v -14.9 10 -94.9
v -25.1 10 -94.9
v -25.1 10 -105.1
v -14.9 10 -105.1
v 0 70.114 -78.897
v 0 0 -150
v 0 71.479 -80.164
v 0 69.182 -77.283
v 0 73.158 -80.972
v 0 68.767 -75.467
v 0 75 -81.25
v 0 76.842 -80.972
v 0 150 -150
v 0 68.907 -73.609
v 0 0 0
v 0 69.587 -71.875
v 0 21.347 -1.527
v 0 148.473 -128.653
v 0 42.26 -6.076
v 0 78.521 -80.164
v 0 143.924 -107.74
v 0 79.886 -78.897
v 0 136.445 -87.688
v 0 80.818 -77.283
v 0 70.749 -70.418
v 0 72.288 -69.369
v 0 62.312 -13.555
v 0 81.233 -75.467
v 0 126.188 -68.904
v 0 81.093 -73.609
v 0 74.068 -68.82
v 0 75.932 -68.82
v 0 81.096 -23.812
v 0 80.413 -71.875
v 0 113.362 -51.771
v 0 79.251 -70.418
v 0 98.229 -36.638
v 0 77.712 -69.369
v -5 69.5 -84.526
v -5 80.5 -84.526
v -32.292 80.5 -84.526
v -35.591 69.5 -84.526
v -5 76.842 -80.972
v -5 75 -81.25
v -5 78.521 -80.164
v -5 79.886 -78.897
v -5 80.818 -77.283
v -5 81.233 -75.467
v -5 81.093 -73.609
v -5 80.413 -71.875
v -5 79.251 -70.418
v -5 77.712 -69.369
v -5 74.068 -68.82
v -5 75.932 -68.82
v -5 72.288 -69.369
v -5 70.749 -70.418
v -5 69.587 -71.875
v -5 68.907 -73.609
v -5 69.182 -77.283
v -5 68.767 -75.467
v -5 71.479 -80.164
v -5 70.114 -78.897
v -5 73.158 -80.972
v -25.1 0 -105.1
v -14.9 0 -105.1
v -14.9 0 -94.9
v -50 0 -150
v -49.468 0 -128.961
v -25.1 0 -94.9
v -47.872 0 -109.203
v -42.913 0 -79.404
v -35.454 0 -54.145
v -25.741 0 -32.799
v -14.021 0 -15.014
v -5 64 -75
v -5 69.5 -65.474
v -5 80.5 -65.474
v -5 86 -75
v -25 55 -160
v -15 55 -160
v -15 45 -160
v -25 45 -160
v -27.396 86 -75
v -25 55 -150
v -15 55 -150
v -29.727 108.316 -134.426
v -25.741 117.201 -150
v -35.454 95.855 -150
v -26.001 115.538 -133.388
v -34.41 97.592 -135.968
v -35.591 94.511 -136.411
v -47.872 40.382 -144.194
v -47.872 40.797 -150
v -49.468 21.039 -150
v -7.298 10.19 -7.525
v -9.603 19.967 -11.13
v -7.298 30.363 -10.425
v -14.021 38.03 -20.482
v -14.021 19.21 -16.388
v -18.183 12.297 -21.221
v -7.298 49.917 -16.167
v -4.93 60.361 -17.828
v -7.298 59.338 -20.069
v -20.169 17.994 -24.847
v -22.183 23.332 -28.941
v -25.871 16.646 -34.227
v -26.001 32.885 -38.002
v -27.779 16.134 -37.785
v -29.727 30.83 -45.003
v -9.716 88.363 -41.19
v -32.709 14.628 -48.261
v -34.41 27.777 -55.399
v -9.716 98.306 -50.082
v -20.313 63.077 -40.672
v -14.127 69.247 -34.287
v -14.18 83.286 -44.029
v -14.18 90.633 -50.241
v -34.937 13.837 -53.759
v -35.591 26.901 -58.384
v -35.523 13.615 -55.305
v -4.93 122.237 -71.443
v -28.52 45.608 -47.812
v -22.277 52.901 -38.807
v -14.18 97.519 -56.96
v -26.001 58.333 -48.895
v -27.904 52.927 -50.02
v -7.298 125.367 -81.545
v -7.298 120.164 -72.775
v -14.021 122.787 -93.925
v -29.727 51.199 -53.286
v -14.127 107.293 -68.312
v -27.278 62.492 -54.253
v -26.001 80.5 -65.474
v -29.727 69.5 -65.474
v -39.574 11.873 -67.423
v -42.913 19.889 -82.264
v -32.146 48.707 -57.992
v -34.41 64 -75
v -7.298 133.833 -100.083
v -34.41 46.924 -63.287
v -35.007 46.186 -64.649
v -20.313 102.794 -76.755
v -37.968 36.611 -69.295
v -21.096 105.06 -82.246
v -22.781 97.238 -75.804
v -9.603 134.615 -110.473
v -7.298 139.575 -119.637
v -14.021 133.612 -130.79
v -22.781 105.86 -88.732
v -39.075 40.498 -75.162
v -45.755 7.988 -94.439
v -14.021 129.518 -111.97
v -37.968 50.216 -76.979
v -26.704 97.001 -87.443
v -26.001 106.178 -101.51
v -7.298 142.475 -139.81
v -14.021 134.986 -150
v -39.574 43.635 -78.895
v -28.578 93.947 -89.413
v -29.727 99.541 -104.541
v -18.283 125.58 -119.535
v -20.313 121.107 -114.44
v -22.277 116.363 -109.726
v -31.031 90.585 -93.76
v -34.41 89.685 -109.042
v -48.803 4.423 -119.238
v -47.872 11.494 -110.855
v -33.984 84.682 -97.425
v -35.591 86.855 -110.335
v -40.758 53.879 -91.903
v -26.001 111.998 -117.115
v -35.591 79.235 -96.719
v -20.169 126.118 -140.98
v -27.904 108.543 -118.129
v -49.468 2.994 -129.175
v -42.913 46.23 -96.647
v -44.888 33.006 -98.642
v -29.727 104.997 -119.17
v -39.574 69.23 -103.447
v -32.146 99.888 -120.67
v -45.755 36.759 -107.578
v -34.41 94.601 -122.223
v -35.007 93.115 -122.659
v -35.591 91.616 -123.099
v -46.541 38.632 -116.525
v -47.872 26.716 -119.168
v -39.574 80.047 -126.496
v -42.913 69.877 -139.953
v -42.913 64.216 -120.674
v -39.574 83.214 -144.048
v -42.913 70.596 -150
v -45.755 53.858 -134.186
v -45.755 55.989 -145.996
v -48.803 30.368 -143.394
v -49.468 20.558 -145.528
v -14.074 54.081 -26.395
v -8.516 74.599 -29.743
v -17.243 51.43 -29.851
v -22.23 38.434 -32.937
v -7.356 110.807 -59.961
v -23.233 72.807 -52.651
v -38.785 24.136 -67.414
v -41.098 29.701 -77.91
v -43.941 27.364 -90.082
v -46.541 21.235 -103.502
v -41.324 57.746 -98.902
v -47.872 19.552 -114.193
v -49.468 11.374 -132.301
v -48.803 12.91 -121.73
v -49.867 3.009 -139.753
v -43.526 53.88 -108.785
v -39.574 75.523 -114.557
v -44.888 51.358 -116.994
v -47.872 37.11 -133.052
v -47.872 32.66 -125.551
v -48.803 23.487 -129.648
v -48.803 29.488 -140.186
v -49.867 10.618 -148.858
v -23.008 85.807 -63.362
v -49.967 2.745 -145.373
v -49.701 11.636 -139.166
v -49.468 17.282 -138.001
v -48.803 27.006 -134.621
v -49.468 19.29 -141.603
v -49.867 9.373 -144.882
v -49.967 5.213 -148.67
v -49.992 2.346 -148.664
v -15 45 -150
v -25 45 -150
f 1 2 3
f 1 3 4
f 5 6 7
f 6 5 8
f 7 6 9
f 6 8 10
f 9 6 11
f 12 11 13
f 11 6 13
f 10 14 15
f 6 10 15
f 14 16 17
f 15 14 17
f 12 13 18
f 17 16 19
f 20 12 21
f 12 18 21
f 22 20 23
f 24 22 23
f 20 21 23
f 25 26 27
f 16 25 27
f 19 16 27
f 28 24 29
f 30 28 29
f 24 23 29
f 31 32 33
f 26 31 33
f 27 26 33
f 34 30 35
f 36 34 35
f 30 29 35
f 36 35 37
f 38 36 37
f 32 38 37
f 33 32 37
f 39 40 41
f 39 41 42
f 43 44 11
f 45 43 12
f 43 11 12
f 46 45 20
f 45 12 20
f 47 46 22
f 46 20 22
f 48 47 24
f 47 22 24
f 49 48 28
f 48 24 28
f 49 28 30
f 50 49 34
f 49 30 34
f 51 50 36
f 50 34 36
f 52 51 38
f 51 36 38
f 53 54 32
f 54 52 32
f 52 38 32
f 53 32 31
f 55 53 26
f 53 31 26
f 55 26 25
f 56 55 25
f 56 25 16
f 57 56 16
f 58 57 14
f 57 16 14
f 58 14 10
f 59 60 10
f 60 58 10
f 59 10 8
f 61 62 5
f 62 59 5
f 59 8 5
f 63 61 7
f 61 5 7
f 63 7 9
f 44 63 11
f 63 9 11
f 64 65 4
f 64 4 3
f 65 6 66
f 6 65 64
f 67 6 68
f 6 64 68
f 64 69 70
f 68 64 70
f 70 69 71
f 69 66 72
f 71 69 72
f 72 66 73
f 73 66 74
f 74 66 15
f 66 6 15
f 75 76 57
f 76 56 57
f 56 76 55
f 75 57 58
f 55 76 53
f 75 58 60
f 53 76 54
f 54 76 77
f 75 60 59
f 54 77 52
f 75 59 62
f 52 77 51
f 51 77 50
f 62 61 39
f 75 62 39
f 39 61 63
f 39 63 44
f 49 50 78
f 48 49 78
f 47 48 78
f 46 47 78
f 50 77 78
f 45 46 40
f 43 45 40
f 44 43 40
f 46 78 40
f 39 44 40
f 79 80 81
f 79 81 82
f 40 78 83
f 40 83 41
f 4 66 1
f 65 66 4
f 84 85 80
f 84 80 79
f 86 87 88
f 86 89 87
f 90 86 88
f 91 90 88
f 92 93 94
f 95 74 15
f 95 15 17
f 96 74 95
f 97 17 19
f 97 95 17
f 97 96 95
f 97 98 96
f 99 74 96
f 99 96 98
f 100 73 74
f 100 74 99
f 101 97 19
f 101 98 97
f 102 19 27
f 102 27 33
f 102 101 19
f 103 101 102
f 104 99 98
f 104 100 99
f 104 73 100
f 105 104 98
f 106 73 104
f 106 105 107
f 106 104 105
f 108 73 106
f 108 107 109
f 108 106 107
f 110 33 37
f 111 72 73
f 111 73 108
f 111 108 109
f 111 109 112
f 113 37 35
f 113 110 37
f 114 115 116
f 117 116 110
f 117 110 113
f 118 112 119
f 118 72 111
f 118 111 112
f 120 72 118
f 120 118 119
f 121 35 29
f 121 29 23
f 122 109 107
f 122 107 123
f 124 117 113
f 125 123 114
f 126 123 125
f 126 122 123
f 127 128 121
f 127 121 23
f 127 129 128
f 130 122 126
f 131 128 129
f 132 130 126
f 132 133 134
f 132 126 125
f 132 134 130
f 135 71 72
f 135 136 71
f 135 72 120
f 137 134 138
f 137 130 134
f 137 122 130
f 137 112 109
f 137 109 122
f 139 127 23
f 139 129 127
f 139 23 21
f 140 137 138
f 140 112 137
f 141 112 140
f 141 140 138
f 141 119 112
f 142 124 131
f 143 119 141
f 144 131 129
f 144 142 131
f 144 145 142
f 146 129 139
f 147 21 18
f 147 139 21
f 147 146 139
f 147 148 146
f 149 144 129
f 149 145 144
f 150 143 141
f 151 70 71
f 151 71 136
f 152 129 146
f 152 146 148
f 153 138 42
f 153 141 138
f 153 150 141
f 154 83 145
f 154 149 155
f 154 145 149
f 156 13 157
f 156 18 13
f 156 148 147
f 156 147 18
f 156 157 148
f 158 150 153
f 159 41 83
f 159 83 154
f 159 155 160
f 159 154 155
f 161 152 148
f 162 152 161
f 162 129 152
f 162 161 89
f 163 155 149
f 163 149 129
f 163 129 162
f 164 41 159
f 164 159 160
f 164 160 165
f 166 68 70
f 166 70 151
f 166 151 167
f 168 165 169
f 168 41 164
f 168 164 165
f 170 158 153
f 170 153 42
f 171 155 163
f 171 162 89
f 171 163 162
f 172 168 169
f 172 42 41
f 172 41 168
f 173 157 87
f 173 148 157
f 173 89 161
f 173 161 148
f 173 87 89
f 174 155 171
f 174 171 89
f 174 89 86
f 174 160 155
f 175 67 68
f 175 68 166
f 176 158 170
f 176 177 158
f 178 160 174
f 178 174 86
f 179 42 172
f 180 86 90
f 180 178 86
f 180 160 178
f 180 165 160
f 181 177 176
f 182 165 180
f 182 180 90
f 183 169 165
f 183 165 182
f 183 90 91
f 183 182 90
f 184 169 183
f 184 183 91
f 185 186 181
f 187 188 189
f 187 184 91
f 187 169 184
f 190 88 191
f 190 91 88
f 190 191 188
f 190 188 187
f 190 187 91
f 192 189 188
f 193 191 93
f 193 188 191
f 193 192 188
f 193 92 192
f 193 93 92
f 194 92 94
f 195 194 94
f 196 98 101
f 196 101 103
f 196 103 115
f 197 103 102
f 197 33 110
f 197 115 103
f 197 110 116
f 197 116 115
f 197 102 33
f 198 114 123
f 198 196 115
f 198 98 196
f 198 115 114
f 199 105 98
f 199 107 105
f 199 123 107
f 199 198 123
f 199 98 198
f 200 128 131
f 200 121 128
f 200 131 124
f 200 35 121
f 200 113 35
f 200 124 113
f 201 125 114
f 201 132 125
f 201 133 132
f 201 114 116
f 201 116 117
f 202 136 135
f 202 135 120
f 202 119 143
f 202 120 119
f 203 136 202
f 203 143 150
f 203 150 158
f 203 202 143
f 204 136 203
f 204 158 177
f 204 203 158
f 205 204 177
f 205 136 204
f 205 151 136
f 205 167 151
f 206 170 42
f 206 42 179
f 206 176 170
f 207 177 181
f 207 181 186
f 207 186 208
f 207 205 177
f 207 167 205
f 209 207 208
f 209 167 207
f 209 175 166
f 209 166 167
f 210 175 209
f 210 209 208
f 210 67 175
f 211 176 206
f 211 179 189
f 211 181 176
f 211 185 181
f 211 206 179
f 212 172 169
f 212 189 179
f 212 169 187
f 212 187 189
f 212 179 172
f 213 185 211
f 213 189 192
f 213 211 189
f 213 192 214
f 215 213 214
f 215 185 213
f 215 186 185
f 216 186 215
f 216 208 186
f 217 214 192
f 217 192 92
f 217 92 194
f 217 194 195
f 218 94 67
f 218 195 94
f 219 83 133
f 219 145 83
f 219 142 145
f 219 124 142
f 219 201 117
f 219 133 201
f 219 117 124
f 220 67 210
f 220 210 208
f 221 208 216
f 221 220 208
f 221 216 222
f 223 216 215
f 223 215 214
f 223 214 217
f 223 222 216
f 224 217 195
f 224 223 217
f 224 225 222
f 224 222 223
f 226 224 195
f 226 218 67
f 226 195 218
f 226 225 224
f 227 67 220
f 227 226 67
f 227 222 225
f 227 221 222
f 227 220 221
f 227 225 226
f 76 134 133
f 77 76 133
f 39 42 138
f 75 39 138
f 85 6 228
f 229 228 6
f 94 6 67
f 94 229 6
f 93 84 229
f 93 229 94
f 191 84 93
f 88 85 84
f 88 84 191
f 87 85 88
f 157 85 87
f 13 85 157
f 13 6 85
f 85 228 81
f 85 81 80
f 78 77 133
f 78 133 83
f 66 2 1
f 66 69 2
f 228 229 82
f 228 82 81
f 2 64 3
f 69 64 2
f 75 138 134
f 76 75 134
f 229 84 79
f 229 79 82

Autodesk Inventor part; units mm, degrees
ref_plane "YZ Plane" through (0, 0, 0) normal (1, 0, 0) x (0, 1, 0)
ref_plane "XZ Plane" through (0, 0, 0) normal (0, 1, 0) x (-1, 0, 0)
ref_plane "XY Plane" through (0, 0, 0) normal (0, 0, 1) x (1, 0, 0)
sketch "Sketch1" plane through (0, 0, 0) normal (0, 1, 0) x (-1, 0, 0)
  line L0 (0, 0) -> (0, -150)
  line L1 (0, -150) -> (50, -150)
  line L2 (0, 0) -> (50, -44.9152) construction
  line L3 (50, -44.9152) -> (50, -150) construction
  spline S0 degree 2 poles (0, 0) (50, -44.9152) (50, -150) knots 1 1 1 2 2 2
  dimension "d0" = 150
  dimension "d2" = 50
revolve "Revolution1" add sketch "Sketch1" angle 90 about axis through (0, 0, -150) along (-1, 0, 0)
sketch "Sketch2" plane through (0, 0, -150) normal (0, 0, -1) x (-1, 0, 0)
  line L0 (0, 150) -> (0, 0) projected
  line L1 (0, 0) -> (50, 0) projected
  line L2 (0, 0) -> (20, 0)
  line L3 (20, 0) -> (20, 50)
  line L4 (15, 55) -> (25, 55)
  line L5 (25, 55) -> (25, 45)
  line L6 (25, 45) -> (15, 45)
  line L7 (15, 45) -> (15, 55)
  line L8 (15, 55) -> (25, 45) construction
  line L9 (25, 55) -> (15, 45) construction
  dimension "d9" = 20
  dimension "d10" = 50
  dimension "d11" = 10
  dimension "d12" = 10
extrude "Extrusion1" add sketch "Sketch2" along normal blind 10
sketch "Sketch3" plane through (-50, 0, -150) normal (0, -1, 0) x (1, 0, 0)
  line L0 (50, 0) -> (30, 0)
  line L1 (50, 0) -> (0, 0) projected
  line L2 (30, 0) -> (30, 50)
  line L3 (35.1, 44.9) -> (24.9, 44.9)
  line L4 (24.9, 44.9) -> (24.9, 55.1)
  line L5 (24.9, 55.1) -> (35.1, 55.1)
  line L6 (35.1, 55.1) -> (35.1, 44.9)
  line L7 (35.1, 44.9) -> (24.9, 55.1) construction
  line L8 (24.9, 44.9) -> (35.1, 55.1) construction
  point P0 (50, 150)
  dimension "d19" = 20
  dimension "d20" = 50
  dimension "d21" = 10.2
  dimension "d22" = 10.2
extrude "Extrusion2" cut sketch "Sketch3" against normal blind 10
sketch "Sketch4" plane through (0, 0, 0) normal (1, 0, 0) x (0, 0, -1)
  line L0 (0, 0) -> (150, 0) projected
  line L1 (150, 0) -> (150, 75)
  line L2 (150, 150) -> (150, 0) projected
  line L3 (150, 75) -> (75, 75)
  circle A0 centre (75, 75) radius 6.25
  line L4 (75, 75) -> (75, 64)
  line L5 (75, 75) -> (84.5263, 69.5)
  line L6 (75, 75) -> (84.5263, 80.5)
  line L7 (75, 75) -> (75, 86)
  line L8 (75, 75) -> (65.4737, 80.5)
  line L9 (75, 75) -> (65.4737, 69.5)
  line L10 (75, 64) -> (65.4737, 69.5)
  line L11 (65.4737, 69.5) -> (65.4737, 80.5)
  line L12 (65.4737, 80.5) -> (75, 86)
  line L13 (75, 86) -> (84.5263, 80.5)
  line L14 (84.5263, 80.5) -> (84.5263, 69.5)
  line L15 (84.5263, 69.5) -> (75, 64)
  dimension "d25" = 75
  dimension "d26" = 75
  dimension "d27" = 12.5
  dimension "d33" = 11
  dimension "d36" = 360
extrude "Extrusion5" cut sketch "Sketch4" against normal blind 59.85
extrude "Extrusion6" add sketch "Sketch4" against normal blind 5 contours A0 L6 L14 L3 | L3 L14 L5 A0 | A0 L7 L13 L6 | L5 L15 L4 A0 | L4 L10 L9 A0 | A0 L8 L12 L7 | A0 L9 L11 L8
properties part number "3DPrintShapeCorner"
